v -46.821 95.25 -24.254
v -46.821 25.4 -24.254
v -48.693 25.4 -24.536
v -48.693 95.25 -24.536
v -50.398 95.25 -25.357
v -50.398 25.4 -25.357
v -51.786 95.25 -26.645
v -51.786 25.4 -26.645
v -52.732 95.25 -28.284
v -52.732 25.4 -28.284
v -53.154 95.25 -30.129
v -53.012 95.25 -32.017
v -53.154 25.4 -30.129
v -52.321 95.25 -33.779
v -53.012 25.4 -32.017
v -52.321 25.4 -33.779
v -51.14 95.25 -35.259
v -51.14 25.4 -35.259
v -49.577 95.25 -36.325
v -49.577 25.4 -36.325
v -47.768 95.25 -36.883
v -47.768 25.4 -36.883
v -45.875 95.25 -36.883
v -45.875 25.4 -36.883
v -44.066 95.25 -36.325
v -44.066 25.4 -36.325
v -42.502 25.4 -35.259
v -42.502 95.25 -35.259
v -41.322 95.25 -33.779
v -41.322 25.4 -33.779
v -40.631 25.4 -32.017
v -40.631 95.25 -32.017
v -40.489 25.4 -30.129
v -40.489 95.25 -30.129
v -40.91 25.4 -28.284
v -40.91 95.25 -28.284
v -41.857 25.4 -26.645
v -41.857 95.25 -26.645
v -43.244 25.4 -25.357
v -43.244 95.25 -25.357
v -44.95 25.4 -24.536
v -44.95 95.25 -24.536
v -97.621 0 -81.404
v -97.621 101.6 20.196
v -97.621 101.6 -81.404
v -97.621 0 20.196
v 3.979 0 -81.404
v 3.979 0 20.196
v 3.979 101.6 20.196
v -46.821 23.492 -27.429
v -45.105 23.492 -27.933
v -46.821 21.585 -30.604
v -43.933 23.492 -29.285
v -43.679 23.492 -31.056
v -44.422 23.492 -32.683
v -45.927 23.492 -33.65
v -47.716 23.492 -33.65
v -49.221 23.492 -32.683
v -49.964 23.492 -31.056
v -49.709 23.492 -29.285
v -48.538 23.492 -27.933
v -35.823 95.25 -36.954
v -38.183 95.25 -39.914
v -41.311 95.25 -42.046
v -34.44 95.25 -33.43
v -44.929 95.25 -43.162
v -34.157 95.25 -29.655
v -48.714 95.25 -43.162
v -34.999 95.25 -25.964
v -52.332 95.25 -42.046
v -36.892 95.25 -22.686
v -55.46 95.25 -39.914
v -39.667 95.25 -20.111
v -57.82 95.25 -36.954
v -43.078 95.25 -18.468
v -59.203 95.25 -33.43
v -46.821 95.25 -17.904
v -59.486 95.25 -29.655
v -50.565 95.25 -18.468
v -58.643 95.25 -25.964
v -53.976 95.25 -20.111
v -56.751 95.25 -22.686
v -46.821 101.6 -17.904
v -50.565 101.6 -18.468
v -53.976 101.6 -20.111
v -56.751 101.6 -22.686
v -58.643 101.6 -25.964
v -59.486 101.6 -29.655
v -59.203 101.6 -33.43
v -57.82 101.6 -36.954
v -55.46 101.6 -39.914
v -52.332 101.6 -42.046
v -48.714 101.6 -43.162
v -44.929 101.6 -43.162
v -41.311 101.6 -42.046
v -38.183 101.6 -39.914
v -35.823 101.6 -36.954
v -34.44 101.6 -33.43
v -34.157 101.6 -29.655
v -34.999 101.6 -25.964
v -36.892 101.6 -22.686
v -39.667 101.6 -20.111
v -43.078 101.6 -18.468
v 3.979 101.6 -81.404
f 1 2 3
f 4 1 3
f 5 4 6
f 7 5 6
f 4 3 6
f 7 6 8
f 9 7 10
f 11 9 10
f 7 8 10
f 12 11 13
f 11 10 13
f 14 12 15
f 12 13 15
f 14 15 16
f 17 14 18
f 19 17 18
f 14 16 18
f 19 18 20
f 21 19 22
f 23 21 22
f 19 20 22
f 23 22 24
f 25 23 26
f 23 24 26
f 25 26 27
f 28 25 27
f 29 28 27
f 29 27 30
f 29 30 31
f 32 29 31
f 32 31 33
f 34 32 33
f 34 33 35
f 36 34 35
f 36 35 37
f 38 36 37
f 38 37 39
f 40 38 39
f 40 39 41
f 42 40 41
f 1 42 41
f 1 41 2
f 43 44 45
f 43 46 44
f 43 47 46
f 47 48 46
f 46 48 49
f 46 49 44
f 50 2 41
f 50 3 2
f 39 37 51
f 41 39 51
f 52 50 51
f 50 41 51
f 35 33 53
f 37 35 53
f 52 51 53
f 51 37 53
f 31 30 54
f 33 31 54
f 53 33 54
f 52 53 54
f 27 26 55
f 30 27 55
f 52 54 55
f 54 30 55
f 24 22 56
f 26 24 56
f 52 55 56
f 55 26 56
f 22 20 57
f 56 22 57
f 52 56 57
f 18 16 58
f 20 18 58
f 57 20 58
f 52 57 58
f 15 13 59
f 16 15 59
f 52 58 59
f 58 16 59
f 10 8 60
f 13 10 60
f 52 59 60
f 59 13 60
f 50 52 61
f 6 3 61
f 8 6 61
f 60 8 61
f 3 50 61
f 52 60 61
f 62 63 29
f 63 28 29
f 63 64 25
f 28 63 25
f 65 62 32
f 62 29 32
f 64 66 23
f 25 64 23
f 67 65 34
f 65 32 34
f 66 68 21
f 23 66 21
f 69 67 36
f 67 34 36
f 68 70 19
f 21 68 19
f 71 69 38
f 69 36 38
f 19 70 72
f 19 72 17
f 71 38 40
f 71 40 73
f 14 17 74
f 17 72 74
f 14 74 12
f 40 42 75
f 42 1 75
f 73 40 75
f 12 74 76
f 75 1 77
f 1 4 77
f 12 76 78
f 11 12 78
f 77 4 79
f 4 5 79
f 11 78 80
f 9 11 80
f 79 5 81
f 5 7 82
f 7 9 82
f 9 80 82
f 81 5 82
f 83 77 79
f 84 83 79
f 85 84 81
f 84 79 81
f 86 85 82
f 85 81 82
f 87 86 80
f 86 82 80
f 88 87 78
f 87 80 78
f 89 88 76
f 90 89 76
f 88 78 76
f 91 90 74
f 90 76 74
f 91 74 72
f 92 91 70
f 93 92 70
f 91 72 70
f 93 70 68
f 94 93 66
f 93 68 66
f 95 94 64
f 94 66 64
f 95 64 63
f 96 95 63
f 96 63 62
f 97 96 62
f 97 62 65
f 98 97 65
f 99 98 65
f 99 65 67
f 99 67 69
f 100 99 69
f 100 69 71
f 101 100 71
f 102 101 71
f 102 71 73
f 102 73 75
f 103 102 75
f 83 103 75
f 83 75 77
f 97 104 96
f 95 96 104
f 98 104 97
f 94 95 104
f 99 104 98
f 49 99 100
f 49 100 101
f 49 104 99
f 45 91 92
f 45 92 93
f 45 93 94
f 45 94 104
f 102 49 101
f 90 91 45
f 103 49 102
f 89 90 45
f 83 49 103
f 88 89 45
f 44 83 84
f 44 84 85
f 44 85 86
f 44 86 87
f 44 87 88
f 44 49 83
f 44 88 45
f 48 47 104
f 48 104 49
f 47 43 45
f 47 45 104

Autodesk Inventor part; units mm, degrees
ref_plane "YZ Plane" through (0, 0, 0) normal (1, 0, 0) x (0, 1, 0)
ref_plane "XZ Plane" through (0, 0, 0) normal (0, 1, 0) x (-1, 0, 0)
ref_plane "XY Plane" through (0, 0, 0) normal (0, 0, 1) x (1, 0, 0)
sketch "Sketch1" plane through (0, 0, 0) normal (0, 1, 0) x (-1, 0, 0)
  line L0 (-3.9786, 20.196) -> (97.6214, 20.196)
  line L1 (97.6214, 20.196) -> (97.6214, -81.404)
  line L2 (97.6214, -81.404) -> (-3.9786, -81.404)
  line L3 (-3.9786, -81.404) -> (-3.9786, 20.196)
  point P0 (0, 0)
  dimension "d0" = 101.6
  dimension "d1" = 101.6
extrude "Extrusion1" add sketch "Sketch1" along normal blind 101.6
sketch "Sketch2" plane through (0, 101.6, 0) normal (0, 1, 0) x (1, 0, 0)
  line L0 (3.9786, 81.404) -> (-97.6214, 81.404) projected
  line L1 (-97.6214, -20.196) -> (3.9786, -20.196) projected
  circle A0 centre (-46.8214, 30.604) radius 25.4
  point P0 (0, 0)
  dimension "d4" = 50.8
hole "Hole1" at (-46.8214, 101.6, -30.604) direction (0, -1, 0) diameter 12.7 depth 76.2 tip angle 118 counterbore diameter 25.4 counterbore depth 6.35
